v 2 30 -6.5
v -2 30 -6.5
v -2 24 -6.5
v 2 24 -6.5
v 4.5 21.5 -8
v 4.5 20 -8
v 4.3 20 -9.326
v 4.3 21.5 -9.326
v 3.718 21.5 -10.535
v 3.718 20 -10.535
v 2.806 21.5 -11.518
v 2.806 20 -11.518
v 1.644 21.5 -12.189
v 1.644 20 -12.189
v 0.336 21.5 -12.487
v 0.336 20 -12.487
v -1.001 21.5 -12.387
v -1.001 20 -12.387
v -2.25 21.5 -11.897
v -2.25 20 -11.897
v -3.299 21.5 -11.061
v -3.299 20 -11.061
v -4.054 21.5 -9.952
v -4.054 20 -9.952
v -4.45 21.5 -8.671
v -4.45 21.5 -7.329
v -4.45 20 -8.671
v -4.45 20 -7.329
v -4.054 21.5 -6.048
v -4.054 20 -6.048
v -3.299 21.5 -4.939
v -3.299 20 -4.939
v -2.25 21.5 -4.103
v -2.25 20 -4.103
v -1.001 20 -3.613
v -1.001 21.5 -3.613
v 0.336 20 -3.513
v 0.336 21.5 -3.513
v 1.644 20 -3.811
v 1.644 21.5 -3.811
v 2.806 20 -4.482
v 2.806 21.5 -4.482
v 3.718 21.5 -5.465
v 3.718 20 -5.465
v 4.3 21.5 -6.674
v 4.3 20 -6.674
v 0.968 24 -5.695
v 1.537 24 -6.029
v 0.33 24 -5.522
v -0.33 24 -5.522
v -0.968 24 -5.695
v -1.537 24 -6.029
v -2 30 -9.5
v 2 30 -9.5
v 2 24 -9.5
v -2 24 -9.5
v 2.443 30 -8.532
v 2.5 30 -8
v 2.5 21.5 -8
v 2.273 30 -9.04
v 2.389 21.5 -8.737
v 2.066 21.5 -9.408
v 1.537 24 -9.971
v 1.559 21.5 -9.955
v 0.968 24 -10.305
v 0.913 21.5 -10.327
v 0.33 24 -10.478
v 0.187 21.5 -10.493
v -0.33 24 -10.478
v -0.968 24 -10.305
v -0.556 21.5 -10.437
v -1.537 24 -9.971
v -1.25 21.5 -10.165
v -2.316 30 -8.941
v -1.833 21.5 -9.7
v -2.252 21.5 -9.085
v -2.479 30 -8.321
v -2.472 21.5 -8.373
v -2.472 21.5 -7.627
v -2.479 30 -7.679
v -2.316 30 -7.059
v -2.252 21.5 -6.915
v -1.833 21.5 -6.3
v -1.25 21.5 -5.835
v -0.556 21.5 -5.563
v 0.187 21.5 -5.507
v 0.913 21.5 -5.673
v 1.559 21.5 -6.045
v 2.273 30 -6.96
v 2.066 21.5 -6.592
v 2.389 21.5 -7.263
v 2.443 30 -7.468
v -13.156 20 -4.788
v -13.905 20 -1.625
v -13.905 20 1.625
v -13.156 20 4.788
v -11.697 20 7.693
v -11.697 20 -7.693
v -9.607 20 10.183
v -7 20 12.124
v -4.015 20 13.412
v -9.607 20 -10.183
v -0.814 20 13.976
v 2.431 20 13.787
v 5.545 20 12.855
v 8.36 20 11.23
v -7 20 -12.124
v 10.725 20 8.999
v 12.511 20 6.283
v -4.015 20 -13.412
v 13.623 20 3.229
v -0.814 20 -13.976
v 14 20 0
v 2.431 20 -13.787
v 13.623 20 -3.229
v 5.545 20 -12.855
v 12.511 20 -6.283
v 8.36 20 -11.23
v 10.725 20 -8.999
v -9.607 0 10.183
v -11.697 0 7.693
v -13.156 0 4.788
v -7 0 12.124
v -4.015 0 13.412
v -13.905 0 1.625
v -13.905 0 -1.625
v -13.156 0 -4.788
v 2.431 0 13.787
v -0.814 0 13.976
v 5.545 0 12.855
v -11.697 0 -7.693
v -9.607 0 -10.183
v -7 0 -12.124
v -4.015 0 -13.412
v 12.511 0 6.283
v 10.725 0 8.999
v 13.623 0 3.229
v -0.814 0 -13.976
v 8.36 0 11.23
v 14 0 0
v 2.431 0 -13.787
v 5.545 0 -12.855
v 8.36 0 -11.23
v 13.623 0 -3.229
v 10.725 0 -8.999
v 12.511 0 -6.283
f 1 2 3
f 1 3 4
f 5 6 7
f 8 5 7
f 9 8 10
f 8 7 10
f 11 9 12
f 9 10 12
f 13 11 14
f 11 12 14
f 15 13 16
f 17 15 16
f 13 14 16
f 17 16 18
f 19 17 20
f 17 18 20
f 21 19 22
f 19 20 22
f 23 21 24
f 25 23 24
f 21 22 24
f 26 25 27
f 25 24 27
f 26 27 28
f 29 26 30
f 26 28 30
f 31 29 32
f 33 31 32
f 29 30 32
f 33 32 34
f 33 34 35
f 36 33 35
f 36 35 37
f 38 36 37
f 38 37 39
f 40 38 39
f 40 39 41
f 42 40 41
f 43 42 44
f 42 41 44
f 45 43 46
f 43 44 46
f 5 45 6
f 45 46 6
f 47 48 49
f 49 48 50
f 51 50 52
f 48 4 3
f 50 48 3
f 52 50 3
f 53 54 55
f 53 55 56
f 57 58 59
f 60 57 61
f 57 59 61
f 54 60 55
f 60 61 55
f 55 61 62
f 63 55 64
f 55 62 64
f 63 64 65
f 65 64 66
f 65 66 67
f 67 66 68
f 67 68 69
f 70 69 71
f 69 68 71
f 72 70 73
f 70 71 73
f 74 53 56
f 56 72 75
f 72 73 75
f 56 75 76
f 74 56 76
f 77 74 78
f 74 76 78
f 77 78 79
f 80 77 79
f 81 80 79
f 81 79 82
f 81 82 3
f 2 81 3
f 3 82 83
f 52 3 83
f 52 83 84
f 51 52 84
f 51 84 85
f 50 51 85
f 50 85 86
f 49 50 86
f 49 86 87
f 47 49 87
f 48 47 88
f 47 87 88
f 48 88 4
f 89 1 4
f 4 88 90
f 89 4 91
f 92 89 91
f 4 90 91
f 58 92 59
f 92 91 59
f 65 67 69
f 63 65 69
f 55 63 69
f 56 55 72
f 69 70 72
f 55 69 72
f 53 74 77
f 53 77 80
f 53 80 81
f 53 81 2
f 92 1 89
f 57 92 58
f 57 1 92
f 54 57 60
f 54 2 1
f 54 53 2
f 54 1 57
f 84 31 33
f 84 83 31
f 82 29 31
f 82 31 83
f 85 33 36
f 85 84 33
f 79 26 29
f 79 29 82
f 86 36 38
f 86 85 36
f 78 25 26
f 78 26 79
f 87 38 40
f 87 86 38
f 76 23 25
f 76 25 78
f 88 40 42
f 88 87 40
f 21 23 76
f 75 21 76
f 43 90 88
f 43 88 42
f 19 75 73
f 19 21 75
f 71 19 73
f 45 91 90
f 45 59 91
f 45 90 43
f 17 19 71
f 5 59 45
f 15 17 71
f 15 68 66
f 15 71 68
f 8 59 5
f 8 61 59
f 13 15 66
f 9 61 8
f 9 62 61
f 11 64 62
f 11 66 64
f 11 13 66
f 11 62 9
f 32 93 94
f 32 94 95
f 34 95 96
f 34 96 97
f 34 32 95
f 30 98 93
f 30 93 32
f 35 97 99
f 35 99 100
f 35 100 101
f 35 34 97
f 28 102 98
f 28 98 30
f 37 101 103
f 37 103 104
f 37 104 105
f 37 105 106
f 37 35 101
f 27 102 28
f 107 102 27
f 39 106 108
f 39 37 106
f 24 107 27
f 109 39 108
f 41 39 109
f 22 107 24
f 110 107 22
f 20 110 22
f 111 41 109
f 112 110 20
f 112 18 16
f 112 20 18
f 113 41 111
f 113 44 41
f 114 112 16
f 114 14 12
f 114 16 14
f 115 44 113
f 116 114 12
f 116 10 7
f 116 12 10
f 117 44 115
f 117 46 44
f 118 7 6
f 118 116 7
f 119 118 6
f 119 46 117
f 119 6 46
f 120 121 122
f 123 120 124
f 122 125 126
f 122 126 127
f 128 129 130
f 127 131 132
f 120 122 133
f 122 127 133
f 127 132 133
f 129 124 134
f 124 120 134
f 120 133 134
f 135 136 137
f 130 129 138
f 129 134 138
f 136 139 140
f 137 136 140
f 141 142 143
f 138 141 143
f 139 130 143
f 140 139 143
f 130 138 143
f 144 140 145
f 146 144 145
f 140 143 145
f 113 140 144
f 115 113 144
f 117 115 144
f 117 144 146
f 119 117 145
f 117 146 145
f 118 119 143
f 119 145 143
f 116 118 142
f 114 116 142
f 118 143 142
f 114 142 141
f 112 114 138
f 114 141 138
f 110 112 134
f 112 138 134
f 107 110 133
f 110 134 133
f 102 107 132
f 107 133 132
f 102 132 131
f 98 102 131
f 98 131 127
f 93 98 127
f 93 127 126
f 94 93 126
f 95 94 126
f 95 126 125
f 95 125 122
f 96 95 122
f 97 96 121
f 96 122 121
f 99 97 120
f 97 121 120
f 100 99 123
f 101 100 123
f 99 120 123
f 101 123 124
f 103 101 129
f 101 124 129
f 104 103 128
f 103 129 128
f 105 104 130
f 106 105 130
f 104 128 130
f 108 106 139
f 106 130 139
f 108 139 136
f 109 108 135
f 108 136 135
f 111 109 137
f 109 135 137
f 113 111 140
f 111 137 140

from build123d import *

# Parameters (mm, degrees)
SKETCH1_R           = 14
BOSS_EXTRUDE1_DEPTH = 20
SKETCH3_R           = 4.5
BOSS_EXTRUDE2_DEPTH = 1.5
SKETCH4_R           = 2.5
BOSS_EXTRUDE3_DEPTH = 8.5
CUT_EXTRUDE1_DEPTH  = 6


with BuildPart() as part:
    # Sketch1 → Boss-Extrude1 (new body)
    with BuildSketch(Plane(origin=(0, 0, 0), x_dir=(1, 0, 0), z_dir=(0, 1, 0))):
        Circle(SKETCH1_R)
    extrude(amount=BOSS_EXTRUDE1_DEPTH)

    # Sketch3 → Boss-Extrude2 (add)
    with BuildSketch(Plane(origin=(0, 20, 0), x_dir=(1, 0, 0), z_dir=(0, 1, 0))):
        with Locations((0, 8)):
            Circle(SKETCH3_R)
    extrude(amount=BOSS_EXTRUDE2_DEPTH)

    # Sketch4 → Boss-Extrude3 (add)
    with BuildSketch(Plane(origin=(0, 21.5, 0), x_dir=(1, 0, 0), z_dir=(0, 1, 0))):
        with Locations((0, 8)):
            Circle(SKETCH4_R)
    extrude(amount=BOSS_EXTRUDE3_DEPTH)

    # Sketch5 → Cut-Extrude1 (cut)
    with BuildSketch(Plane(origin=(0, 30, 0), x_dir=(1, 0, 0), z_dir=(0, 1, 0))):
        with BuildLine():
            Line((2, 9.5), (-2, 9.5))
            ThreePointArc((-2, 9.5), (0, 10.5), (2, 9.5))
        make_face()
        with BuildLine():
            Line((-2, 6.5), (2, 6.5))
            ThreePointArc((2, 6.5), (0, 5.5), (-2, 6.5))
        make_face()
    extrude(amount=-CUT_EXTRUDE1_DEPTH, mode=Mode.SUBTRACT)


solid = part.part
